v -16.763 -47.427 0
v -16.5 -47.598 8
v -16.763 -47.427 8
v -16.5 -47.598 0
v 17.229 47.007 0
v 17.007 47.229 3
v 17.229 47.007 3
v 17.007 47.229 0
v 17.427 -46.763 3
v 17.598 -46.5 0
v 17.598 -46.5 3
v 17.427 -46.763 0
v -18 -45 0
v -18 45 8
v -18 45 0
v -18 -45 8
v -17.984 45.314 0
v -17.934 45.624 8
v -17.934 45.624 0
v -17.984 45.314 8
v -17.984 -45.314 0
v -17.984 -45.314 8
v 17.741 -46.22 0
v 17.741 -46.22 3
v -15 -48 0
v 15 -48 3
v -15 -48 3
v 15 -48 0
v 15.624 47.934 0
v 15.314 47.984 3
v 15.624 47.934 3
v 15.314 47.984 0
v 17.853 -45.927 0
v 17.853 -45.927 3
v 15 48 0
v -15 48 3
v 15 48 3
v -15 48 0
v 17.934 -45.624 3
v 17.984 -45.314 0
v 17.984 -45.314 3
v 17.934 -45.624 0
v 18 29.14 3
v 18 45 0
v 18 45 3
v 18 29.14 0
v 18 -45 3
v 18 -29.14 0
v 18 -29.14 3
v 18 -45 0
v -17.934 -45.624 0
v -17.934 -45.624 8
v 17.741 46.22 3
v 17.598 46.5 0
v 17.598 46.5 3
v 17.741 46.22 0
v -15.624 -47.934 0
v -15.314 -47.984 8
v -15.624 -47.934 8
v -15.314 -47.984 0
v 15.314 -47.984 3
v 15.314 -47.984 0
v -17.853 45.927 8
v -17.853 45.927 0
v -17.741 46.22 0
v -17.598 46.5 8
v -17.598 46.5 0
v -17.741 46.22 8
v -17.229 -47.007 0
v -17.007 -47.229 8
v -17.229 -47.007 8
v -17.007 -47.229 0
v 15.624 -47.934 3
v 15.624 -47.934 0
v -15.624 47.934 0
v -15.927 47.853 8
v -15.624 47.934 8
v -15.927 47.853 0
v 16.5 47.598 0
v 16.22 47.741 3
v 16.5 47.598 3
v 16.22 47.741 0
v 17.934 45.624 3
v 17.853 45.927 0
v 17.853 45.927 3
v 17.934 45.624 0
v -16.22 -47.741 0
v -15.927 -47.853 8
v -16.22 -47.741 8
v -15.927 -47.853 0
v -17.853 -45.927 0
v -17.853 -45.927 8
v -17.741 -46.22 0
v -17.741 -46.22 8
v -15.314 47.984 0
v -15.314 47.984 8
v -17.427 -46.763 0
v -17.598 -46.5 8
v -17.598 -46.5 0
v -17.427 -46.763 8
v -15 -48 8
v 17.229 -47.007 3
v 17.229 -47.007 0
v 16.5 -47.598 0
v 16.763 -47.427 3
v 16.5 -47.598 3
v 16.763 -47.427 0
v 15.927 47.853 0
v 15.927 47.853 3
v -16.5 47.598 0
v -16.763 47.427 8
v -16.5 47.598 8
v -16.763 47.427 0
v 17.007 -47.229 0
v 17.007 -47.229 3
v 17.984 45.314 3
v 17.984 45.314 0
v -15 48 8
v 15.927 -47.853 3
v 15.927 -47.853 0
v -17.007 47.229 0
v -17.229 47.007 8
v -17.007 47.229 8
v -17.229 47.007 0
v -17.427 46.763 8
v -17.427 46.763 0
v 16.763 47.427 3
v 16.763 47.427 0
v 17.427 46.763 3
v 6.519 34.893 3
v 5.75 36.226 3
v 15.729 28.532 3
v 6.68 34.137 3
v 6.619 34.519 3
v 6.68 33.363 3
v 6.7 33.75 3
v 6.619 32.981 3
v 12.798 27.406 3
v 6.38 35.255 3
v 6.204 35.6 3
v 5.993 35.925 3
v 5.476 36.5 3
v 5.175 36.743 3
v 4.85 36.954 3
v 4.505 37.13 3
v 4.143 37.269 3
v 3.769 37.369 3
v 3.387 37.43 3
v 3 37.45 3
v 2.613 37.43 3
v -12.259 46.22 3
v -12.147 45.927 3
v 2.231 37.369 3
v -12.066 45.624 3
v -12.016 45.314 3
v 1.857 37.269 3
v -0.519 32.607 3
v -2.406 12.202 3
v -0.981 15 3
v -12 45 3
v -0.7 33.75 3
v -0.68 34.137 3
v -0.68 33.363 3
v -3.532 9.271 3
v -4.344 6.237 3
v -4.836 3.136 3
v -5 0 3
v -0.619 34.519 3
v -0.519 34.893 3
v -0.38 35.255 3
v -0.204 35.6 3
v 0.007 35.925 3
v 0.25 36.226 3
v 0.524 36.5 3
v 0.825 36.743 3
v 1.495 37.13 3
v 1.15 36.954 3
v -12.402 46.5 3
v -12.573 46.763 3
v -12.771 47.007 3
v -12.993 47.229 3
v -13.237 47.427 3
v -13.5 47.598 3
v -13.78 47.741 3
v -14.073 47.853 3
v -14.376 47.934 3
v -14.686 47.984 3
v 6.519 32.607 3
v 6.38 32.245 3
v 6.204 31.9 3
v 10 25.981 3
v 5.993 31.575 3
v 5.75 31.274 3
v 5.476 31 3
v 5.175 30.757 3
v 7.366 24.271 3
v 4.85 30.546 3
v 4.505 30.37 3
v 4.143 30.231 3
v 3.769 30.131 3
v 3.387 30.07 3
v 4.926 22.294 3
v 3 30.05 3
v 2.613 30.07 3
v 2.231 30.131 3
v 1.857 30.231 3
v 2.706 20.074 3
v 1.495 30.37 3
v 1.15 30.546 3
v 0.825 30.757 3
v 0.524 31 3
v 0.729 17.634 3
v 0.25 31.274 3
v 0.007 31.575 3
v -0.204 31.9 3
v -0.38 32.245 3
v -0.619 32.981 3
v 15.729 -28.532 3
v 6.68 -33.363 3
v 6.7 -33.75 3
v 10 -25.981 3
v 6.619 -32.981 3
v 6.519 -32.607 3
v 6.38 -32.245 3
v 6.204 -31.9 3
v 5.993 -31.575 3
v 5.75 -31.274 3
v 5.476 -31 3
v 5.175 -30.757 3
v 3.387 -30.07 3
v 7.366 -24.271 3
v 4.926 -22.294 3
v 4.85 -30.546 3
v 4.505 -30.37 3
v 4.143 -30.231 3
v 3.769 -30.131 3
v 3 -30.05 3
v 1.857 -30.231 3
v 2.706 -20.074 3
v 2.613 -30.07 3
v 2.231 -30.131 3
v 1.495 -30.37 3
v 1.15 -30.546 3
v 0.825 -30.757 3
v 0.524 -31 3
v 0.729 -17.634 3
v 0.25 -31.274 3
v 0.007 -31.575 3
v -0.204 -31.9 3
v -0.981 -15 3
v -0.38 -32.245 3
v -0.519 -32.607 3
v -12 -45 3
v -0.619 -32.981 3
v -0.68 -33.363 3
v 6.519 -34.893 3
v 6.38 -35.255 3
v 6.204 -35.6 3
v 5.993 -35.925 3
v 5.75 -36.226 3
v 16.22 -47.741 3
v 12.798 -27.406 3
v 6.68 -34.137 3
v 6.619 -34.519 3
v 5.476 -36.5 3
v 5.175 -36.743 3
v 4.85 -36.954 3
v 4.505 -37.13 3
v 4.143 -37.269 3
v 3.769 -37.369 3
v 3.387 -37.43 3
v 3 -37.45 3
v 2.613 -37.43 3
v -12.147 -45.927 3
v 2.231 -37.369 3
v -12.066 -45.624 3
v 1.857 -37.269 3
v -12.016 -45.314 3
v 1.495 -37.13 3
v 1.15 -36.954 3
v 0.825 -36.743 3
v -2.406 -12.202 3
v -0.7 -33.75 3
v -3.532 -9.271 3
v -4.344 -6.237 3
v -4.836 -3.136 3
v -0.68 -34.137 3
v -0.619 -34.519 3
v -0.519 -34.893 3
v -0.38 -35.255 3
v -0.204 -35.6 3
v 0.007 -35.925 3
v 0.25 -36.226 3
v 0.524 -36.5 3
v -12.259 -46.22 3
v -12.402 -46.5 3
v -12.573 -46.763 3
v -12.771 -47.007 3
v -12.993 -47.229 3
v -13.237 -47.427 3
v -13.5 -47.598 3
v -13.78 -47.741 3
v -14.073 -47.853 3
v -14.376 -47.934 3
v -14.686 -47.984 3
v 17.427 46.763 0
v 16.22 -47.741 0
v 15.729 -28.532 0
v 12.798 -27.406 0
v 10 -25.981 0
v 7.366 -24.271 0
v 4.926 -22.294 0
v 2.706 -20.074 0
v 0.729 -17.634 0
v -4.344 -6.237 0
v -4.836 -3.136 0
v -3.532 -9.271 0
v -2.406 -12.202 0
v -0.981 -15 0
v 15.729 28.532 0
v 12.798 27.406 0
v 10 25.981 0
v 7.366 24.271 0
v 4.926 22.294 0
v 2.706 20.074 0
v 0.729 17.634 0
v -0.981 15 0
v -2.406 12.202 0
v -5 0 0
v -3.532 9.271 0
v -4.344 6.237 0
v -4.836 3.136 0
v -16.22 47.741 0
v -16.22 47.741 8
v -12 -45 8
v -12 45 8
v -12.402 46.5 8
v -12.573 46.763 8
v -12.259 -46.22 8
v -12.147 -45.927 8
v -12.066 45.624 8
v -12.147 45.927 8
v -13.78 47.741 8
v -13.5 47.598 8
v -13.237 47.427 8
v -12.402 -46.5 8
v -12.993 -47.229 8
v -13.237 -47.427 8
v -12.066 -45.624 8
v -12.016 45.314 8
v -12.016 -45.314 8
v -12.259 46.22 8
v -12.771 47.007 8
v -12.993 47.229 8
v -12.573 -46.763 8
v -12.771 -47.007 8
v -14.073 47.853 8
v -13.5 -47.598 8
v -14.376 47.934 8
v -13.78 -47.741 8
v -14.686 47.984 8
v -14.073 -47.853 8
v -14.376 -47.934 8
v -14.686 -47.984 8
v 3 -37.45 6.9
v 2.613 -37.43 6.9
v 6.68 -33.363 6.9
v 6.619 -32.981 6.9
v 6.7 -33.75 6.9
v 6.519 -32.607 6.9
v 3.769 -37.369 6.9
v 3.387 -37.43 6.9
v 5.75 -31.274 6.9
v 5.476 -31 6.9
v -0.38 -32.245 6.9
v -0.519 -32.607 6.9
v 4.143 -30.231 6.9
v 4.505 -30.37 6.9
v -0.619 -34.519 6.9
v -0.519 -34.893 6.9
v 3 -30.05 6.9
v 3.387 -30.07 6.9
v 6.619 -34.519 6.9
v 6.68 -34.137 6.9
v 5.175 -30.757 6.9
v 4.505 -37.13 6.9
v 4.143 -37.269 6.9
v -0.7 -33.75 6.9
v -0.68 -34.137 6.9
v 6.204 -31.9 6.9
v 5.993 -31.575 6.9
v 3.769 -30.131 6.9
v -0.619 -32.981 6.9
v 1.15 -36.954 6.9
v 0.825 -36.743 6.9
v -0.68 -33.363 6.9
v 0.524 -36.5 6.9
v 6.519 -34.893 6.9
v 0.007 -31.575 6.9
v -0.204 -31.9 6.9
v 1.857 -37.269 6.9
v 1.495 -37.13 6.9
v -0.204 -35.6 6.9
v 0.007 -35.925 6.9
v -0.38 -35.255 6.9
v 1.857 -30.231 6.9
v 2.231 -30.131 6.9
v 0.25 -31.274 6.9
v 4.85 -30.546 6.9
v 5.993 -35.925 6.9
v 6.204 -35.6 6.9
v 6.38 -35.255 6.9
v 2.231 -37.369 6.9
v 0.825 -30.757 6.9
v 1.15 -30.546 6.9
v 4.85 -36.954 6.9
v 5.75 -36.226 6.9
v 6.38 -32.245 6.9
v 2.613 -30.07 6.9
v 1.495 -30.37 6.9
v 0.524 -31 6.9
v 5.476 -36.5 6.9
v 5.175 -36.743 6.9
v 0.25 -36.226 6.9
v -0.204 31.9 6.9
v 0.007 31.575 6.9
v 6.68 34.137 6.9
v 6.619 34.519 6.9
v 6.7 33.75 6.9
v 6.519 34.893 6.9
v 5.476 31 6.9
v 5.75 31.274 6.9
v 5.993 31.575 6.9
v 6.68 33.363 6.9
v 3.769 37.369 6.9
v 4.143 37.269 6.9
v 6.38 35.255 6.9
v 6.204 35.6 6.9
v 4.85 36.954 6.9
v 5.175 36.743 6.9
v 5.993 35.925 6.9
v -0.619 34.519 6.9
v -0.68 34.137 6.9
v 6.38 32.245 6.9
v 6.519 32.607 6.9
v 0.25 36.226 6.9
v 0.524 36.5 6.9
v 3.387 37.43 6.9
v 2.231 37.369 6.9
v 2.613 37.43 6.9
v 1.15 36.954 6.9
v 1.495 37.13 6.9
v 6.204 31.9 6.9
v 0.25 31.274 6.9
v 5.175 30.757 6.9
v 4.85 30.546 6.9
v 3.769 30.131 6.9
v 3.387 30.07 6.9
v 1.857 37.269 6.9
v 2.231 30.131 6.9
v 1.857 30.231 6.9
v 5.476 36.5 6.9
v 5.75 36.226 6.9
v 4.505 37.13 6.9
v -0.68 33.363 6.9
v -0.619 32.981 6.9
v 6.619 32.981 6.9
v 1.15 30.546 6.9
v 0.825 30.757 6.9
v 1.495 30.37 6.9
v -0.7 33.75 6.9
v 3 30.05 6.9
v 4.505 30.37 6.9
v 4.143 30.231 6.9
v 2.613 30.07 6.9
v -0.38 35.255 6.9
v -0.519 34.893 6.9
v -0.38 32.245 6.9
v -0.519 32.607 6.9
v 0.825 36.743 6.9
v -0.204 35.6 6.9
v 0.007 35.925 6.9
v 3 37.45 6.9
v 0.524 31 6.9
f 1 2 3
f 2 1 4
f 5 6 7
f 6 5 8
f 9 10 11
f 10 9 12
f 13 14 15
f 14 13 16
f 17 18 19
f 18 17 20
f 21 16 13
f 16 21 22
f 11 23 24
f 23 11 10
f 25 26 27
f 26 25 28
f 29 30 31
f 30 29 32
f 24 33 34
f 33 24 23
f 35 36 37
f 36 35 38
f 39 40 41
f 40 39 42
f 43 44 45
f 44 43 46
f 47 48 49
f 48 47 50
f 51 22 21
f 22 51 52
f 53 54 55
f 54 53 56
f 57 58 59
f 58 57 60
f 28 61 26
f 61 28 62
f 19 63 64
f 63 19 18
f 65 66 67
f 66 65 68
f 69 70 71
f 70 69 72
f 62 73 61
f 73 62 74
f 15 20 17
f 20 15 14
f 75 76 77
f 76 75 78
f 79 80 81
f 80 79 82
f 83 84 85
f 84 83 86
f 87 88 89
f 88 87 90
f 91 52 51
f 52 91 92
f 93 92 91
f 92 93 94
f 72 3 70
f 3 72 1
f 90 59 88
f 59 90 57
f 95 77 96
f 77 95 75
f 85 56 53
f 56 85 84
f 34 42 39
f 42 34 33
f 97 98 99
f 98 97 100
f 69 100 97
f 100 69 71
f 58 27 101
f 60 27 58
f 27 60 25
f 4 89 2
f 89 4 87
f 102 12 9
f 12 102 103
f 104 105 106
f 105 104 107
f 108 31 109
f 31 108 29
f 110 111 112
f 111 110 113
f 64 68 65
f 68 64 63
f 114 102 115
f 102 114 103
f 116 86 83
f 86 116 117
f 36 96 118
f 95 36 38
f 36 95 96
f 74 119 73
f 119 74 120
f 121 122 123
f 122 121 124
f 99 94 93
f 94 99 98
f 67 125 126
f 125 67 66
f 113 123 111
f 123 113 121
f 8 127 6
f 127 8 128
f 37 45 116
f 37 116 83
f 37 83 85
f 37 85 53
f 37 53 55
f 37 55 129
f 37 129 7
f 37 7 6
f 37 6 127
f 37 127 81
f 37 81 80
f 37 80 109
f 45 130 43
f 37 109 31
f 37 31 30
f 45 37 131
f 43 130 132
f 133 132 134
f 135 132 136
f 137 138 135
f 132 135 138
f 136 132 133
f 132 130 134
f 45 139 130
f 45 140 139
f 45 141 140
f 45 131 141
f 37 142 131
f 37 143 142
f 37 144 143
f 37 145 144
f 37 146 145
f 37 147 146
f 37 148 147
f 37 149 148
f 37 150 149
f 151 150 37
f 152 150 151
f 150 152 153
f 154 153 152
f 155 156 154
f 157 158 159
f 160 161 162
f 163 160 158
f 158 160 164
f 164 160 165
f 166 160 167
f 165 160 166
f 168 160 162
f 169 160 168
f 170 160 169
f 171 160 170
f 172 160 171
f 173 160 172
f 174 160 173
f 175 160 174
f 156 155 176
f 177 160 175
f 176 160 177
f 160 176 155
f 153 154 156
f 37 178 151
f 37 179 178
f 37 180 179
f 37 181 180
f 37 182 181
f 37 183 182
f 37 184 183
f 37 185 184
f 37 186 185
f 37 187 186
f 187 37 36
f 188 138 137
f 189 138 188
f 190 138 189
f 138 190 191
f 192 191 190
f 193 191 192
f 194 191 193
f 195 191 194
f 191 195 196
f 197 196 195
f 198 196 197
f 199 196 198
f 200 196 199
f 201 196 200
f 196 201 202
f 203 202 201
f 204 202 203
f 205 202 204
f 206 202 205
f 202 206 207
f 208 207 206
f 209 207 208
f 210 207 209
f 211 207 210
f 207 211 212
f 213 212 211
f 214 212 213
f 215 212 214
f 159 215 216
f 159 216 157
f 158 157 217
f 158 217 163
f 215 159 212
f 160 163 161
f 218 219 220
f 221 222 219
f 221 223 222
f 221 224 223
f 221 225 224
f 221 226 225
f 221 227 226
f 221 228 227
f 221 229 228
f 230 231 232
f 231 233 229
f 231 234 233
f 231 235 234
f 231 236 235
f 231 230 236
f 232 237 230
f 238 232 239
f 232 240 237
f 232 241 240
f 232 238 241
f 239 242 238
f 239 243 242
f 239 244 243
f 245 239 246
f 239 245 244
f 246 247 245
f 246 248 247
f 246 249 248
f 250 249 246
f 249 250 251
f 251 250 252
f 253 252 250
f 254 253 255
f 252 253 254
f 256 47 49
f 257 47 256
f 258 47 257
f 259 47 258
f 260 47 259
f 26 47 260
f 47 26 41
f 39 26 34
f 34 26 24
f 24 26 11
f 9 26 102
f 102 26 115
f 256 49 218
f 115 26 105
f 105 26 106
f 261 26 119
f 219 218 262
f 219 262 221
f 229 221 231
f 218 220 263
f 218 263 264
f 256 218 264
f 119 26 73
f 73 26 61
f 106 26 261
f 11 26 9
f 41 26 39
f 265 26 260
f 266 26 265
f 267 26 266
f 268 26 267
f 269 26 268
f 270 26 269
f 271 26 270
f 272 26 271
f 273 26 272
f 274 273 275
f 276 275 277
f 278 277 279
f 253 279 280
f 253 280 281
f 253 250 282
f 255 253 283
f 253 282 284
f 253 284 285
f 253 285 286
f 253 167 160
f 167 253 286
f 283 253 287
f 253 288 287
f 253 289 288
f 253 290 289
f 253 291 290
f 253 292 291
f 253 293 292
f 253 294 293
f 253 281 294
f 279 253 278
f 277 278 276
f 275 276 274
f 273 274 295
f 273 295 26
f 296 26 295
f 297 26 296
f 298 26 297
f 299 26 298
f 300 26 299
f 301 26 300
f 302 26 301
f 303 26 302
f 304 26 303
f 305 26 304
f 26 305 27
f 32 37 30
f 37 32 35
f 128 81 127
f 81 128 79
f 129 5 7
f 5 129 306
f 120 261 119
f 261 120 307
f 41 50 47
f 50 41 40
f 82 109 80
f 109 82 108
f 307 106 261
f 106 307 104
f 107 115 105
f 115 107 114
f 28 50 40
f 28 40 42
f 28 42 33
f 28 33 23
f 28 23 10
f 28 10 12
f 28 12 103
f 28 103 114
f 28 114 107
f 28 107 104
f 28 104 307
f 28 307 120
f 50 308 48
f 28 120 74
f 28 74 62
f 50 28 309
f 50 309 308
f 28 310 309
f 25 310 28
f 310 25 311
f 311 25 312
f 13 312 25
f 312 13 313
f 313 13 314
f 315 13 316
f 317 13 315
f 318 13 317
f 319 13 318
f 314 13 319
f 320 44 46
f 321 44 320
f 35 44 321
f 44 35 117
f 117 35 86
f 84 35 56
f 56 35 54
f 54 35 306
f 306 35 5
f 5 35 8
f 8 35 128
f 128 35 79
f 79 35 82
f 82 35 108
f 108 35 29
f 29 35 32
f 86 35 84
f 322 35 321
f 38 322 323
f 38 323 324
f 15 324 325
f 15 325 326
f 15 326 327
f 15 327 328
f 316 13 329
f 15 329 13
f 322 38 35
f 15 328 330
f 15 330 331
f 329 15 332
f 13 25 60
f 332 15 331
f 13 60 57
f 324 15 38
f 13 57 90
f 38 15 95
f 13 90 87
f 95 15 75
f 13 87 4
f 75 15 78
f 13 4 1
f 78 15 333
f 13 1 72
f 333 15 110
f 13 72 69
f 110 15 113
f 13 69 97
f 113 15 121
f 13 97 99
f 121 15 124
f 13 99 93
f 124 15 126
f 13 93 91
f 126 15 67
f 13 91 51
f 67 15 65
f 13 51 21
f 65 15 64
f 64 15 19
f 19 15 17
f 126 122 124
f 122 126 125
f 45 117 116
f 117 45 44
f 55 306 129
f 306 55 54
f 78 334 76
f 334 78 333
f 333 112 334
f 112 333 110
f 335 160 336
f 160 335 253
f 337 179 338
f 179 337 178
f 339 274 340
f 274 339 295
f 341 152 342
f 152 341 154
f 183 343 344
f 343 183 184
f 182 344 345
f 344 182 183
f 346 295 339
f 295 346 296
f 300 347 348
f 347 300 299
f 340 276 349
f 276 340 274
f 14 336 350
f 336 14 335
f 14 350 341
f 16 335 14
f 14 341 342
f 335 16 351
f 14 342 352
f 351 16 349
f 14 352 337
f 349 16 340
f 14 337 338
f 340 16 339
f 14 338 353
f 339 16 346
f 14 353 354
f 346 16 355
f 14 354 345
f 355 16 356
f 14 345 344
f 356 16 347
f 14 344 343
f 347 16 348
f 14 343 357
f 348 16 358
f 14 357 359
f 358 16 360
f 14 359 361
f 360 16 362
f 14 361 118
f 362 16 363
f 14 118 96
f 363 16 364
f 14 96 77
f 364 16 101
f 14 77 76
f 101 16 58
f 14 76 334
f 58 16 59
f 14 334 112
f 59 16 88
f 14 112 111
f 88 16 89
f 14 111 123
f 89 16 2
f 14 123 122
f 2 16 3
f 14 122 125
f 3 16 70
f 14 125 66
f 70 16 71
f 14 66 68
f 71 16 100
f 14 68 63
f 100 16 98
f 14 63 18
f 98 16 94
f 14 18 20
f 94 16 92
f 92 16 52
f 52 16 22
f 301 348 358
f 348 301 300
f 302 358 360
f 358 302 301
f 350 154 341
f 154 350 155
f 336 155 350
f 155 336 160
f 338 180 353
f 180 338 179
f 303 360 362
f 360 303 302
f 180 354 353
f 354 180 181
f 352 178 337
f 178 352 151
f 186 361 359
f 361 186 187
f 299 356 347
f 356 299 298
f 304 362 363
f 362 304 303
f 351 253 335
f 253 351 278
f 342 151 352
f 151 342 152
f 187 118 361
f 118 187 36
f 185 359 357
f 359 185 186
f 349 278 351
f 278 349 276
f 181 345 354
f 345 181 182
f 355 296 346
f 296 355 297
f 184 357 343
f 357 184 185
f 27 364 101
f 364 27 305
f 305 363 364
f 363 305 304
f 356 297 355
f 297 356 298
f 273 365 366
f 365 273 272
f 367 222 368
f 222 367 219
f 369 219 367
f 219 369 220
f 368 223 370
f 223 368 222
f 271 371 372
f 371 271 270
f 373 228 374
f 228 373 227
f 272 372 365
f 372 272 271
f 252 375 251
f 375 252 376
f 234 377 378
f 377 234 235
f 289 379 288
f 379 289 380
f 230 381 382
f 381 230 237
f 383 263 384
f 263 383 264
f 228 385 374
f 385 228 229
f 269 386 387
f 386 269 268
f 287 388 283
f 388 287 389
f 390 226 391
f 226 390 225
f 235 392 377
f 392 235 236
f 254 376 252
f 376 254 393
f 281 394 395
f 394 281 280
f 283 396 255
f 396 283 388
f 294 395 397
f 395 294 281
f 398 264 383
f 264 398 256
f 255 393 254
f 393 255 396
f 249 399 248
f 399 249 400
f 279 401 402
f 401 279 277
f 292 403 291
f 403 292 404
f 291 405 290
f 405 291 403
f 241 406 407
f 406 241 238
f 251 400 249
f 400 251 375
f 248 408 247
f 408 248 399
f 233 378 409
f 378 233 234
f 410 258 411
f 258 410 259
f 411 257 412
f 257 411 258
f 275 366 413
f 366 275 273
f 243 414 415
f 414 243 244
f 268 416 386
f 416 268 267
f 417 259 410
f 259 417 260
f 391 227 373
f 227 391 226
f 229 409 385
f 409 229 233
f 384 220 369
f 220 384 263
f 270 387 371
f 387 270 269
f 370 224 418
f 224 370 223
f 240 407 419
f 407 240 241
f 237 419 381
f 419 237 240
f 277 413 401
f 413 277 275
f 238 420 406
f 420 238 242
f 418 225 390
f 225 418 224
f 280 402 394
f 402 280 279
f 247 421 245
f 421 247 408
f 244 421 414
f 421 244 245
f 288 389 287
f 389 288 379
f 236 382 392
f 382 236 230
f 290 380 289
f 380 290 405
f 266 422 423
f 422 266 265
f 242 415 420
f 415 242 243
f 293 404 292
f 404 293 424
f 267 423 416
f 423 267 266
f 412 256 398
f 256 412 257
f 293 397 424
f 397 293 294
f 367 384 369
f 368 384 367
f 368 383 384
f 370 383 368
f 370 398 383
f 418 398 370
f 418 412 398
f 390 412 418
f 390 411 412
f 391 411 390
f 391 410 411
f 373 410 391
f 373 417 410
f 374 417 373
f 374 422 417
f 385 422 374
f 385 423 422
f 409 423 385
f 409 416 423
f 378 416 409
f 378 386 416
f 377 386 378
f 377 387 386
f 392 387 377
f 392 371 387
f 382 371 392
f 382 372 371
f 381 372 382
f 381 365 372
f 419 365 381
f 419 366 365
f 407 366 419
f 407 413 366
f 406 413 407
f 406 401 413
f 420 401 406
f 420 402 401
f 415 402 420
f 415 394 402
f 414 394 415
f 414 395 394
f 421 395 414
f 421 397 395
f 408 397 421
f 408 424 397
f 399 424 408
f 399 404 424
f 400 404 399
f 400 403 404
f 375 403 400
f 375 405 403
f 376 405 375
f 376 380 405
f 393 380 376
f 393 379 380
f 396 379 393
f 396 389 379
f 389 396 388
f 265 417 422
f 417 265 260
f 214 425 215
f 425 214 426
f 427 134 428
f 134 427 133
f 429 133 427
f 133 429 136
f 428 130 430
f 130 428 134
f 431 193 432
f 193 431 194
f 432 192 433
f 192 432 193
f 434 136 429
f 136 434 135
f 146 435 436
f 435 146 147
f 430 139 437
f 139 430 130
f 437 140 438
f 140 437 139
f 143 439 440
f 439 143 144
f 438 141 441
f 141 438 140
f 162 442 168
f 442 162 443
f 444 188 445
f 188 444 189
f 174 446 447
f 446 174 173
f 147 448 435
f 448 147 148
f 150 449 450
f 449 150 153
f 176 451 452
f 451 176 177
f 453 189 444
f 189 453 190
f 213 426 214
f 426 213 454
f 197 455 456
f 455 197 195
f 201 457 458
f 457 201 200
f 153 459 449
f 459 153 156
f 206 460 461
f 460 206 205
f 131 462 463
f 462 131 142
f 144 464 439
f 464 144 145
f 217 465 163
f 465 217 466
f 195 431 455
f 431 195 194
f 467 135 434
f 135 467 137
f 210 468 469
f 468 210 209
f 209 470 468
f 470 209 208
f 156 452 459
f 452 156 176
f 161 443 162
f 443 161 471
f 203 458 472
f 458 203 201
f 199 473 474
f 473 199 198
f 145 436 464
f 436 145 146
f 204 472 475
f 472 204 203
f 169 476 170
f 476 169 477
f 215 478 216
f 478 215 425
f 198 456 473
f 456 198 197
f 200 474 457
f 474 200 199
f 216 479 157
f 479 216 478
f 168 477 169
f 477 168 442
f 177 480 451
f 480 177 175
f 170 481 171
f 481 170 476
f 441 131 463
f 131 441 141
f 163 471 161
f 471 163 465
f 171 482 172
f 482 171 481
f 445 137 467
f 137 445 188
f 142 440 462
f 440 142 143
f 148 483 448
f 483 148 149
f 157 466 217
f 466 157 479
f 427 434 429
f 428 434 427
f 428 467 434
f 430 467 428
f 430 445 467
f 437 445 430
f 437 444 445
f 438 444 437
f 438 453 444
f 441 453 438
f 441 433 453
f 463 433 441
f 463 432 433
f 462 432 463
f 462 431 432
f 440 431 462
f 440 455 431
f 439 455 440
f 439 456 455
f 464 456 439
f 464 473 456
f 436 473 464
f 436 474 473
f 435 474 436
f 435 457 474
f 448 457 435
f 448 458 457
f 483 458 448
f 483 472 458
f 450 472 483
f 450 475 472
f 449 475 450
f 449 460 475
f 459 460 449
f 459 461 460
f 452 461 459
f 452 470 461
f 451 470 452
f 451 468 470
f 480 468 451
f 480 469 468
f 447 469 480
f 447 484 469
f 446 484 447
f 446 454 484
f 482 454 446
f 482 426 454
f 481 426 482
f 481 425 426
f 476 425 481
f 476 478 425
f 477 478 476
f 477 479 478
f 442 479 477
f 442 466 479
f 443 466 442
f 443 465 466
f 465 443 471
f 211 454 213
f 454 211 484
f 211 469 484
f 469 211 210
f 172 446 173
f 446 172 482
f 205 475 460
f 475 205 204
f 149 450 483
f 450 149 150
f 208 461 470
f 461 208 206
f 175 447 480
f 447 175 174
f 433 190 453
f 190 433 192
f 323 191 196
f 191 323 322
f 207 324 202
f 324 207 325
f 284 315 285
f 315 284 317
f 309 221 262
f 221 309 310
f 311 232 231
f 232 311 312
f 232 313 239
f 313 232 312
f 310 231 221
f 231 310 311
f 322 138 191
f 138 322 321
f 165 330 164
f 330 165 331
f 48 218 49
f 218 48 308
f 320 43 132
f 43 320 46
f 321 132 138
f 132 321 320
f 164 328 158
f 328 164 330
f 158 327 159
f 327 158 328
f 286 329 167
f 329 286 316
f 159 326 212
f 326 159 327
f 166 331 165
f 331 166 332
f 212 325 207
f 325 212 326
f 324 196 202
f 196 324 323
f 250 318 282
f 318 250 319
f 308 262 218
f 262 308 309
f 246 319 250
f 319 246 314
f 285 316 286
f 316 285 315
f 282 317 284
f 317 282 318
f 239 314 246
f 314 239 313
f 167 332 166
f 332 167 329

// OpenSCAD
$fn = 60;

/* Base */
length = 90;
width = 30;
height = 4;
border_radius = 3;

/* Abec 7 type bearing */
bearing_width = 4.2;
bearing_radius = 3.7;

module holder_base(width, length, height, radius) {
  base_corners = [
		  [0, 0, 0],
		  [width, 0, 0],
		  [0, length, 0],
		  [width, length, 0]
		  ];

  translate([-width/2, -length/2, 0])
    hull() {
    for (point = base_corners)
      translate(point) cylinder(r = radius, h = radius);
  }

  edge_corners = [
		  [0, 0, 0],
		  [0, length, 0],
		  [0, 0, height],
		  [0, length, height]
		  ];

  translate([-width/2, -length/2, 0])
    hull() {
      for (point = edge_corners) {
	translate(point) cylinder(h = height, r = radius);
      }
  }
}

module bearing_holder(width, radius, position) {
  translate(position)
  cylinder(r = radius, h = width);
}

difference() {
  union() {
    holder_base(width, length, height, border_radius);
    
    bearing_holder(bearing_width, bearing_radius,
		   [border_radius, - 3 * length/8, border_radius * 0.9]);

    bearing_holder(bearing_width, bearing_radius,
		   [border_radius, 3 * length/8, border_radius * 0.9]);
  }

  translate([25, 0, -5])
  cylinder(r=30, h = 20);
}
